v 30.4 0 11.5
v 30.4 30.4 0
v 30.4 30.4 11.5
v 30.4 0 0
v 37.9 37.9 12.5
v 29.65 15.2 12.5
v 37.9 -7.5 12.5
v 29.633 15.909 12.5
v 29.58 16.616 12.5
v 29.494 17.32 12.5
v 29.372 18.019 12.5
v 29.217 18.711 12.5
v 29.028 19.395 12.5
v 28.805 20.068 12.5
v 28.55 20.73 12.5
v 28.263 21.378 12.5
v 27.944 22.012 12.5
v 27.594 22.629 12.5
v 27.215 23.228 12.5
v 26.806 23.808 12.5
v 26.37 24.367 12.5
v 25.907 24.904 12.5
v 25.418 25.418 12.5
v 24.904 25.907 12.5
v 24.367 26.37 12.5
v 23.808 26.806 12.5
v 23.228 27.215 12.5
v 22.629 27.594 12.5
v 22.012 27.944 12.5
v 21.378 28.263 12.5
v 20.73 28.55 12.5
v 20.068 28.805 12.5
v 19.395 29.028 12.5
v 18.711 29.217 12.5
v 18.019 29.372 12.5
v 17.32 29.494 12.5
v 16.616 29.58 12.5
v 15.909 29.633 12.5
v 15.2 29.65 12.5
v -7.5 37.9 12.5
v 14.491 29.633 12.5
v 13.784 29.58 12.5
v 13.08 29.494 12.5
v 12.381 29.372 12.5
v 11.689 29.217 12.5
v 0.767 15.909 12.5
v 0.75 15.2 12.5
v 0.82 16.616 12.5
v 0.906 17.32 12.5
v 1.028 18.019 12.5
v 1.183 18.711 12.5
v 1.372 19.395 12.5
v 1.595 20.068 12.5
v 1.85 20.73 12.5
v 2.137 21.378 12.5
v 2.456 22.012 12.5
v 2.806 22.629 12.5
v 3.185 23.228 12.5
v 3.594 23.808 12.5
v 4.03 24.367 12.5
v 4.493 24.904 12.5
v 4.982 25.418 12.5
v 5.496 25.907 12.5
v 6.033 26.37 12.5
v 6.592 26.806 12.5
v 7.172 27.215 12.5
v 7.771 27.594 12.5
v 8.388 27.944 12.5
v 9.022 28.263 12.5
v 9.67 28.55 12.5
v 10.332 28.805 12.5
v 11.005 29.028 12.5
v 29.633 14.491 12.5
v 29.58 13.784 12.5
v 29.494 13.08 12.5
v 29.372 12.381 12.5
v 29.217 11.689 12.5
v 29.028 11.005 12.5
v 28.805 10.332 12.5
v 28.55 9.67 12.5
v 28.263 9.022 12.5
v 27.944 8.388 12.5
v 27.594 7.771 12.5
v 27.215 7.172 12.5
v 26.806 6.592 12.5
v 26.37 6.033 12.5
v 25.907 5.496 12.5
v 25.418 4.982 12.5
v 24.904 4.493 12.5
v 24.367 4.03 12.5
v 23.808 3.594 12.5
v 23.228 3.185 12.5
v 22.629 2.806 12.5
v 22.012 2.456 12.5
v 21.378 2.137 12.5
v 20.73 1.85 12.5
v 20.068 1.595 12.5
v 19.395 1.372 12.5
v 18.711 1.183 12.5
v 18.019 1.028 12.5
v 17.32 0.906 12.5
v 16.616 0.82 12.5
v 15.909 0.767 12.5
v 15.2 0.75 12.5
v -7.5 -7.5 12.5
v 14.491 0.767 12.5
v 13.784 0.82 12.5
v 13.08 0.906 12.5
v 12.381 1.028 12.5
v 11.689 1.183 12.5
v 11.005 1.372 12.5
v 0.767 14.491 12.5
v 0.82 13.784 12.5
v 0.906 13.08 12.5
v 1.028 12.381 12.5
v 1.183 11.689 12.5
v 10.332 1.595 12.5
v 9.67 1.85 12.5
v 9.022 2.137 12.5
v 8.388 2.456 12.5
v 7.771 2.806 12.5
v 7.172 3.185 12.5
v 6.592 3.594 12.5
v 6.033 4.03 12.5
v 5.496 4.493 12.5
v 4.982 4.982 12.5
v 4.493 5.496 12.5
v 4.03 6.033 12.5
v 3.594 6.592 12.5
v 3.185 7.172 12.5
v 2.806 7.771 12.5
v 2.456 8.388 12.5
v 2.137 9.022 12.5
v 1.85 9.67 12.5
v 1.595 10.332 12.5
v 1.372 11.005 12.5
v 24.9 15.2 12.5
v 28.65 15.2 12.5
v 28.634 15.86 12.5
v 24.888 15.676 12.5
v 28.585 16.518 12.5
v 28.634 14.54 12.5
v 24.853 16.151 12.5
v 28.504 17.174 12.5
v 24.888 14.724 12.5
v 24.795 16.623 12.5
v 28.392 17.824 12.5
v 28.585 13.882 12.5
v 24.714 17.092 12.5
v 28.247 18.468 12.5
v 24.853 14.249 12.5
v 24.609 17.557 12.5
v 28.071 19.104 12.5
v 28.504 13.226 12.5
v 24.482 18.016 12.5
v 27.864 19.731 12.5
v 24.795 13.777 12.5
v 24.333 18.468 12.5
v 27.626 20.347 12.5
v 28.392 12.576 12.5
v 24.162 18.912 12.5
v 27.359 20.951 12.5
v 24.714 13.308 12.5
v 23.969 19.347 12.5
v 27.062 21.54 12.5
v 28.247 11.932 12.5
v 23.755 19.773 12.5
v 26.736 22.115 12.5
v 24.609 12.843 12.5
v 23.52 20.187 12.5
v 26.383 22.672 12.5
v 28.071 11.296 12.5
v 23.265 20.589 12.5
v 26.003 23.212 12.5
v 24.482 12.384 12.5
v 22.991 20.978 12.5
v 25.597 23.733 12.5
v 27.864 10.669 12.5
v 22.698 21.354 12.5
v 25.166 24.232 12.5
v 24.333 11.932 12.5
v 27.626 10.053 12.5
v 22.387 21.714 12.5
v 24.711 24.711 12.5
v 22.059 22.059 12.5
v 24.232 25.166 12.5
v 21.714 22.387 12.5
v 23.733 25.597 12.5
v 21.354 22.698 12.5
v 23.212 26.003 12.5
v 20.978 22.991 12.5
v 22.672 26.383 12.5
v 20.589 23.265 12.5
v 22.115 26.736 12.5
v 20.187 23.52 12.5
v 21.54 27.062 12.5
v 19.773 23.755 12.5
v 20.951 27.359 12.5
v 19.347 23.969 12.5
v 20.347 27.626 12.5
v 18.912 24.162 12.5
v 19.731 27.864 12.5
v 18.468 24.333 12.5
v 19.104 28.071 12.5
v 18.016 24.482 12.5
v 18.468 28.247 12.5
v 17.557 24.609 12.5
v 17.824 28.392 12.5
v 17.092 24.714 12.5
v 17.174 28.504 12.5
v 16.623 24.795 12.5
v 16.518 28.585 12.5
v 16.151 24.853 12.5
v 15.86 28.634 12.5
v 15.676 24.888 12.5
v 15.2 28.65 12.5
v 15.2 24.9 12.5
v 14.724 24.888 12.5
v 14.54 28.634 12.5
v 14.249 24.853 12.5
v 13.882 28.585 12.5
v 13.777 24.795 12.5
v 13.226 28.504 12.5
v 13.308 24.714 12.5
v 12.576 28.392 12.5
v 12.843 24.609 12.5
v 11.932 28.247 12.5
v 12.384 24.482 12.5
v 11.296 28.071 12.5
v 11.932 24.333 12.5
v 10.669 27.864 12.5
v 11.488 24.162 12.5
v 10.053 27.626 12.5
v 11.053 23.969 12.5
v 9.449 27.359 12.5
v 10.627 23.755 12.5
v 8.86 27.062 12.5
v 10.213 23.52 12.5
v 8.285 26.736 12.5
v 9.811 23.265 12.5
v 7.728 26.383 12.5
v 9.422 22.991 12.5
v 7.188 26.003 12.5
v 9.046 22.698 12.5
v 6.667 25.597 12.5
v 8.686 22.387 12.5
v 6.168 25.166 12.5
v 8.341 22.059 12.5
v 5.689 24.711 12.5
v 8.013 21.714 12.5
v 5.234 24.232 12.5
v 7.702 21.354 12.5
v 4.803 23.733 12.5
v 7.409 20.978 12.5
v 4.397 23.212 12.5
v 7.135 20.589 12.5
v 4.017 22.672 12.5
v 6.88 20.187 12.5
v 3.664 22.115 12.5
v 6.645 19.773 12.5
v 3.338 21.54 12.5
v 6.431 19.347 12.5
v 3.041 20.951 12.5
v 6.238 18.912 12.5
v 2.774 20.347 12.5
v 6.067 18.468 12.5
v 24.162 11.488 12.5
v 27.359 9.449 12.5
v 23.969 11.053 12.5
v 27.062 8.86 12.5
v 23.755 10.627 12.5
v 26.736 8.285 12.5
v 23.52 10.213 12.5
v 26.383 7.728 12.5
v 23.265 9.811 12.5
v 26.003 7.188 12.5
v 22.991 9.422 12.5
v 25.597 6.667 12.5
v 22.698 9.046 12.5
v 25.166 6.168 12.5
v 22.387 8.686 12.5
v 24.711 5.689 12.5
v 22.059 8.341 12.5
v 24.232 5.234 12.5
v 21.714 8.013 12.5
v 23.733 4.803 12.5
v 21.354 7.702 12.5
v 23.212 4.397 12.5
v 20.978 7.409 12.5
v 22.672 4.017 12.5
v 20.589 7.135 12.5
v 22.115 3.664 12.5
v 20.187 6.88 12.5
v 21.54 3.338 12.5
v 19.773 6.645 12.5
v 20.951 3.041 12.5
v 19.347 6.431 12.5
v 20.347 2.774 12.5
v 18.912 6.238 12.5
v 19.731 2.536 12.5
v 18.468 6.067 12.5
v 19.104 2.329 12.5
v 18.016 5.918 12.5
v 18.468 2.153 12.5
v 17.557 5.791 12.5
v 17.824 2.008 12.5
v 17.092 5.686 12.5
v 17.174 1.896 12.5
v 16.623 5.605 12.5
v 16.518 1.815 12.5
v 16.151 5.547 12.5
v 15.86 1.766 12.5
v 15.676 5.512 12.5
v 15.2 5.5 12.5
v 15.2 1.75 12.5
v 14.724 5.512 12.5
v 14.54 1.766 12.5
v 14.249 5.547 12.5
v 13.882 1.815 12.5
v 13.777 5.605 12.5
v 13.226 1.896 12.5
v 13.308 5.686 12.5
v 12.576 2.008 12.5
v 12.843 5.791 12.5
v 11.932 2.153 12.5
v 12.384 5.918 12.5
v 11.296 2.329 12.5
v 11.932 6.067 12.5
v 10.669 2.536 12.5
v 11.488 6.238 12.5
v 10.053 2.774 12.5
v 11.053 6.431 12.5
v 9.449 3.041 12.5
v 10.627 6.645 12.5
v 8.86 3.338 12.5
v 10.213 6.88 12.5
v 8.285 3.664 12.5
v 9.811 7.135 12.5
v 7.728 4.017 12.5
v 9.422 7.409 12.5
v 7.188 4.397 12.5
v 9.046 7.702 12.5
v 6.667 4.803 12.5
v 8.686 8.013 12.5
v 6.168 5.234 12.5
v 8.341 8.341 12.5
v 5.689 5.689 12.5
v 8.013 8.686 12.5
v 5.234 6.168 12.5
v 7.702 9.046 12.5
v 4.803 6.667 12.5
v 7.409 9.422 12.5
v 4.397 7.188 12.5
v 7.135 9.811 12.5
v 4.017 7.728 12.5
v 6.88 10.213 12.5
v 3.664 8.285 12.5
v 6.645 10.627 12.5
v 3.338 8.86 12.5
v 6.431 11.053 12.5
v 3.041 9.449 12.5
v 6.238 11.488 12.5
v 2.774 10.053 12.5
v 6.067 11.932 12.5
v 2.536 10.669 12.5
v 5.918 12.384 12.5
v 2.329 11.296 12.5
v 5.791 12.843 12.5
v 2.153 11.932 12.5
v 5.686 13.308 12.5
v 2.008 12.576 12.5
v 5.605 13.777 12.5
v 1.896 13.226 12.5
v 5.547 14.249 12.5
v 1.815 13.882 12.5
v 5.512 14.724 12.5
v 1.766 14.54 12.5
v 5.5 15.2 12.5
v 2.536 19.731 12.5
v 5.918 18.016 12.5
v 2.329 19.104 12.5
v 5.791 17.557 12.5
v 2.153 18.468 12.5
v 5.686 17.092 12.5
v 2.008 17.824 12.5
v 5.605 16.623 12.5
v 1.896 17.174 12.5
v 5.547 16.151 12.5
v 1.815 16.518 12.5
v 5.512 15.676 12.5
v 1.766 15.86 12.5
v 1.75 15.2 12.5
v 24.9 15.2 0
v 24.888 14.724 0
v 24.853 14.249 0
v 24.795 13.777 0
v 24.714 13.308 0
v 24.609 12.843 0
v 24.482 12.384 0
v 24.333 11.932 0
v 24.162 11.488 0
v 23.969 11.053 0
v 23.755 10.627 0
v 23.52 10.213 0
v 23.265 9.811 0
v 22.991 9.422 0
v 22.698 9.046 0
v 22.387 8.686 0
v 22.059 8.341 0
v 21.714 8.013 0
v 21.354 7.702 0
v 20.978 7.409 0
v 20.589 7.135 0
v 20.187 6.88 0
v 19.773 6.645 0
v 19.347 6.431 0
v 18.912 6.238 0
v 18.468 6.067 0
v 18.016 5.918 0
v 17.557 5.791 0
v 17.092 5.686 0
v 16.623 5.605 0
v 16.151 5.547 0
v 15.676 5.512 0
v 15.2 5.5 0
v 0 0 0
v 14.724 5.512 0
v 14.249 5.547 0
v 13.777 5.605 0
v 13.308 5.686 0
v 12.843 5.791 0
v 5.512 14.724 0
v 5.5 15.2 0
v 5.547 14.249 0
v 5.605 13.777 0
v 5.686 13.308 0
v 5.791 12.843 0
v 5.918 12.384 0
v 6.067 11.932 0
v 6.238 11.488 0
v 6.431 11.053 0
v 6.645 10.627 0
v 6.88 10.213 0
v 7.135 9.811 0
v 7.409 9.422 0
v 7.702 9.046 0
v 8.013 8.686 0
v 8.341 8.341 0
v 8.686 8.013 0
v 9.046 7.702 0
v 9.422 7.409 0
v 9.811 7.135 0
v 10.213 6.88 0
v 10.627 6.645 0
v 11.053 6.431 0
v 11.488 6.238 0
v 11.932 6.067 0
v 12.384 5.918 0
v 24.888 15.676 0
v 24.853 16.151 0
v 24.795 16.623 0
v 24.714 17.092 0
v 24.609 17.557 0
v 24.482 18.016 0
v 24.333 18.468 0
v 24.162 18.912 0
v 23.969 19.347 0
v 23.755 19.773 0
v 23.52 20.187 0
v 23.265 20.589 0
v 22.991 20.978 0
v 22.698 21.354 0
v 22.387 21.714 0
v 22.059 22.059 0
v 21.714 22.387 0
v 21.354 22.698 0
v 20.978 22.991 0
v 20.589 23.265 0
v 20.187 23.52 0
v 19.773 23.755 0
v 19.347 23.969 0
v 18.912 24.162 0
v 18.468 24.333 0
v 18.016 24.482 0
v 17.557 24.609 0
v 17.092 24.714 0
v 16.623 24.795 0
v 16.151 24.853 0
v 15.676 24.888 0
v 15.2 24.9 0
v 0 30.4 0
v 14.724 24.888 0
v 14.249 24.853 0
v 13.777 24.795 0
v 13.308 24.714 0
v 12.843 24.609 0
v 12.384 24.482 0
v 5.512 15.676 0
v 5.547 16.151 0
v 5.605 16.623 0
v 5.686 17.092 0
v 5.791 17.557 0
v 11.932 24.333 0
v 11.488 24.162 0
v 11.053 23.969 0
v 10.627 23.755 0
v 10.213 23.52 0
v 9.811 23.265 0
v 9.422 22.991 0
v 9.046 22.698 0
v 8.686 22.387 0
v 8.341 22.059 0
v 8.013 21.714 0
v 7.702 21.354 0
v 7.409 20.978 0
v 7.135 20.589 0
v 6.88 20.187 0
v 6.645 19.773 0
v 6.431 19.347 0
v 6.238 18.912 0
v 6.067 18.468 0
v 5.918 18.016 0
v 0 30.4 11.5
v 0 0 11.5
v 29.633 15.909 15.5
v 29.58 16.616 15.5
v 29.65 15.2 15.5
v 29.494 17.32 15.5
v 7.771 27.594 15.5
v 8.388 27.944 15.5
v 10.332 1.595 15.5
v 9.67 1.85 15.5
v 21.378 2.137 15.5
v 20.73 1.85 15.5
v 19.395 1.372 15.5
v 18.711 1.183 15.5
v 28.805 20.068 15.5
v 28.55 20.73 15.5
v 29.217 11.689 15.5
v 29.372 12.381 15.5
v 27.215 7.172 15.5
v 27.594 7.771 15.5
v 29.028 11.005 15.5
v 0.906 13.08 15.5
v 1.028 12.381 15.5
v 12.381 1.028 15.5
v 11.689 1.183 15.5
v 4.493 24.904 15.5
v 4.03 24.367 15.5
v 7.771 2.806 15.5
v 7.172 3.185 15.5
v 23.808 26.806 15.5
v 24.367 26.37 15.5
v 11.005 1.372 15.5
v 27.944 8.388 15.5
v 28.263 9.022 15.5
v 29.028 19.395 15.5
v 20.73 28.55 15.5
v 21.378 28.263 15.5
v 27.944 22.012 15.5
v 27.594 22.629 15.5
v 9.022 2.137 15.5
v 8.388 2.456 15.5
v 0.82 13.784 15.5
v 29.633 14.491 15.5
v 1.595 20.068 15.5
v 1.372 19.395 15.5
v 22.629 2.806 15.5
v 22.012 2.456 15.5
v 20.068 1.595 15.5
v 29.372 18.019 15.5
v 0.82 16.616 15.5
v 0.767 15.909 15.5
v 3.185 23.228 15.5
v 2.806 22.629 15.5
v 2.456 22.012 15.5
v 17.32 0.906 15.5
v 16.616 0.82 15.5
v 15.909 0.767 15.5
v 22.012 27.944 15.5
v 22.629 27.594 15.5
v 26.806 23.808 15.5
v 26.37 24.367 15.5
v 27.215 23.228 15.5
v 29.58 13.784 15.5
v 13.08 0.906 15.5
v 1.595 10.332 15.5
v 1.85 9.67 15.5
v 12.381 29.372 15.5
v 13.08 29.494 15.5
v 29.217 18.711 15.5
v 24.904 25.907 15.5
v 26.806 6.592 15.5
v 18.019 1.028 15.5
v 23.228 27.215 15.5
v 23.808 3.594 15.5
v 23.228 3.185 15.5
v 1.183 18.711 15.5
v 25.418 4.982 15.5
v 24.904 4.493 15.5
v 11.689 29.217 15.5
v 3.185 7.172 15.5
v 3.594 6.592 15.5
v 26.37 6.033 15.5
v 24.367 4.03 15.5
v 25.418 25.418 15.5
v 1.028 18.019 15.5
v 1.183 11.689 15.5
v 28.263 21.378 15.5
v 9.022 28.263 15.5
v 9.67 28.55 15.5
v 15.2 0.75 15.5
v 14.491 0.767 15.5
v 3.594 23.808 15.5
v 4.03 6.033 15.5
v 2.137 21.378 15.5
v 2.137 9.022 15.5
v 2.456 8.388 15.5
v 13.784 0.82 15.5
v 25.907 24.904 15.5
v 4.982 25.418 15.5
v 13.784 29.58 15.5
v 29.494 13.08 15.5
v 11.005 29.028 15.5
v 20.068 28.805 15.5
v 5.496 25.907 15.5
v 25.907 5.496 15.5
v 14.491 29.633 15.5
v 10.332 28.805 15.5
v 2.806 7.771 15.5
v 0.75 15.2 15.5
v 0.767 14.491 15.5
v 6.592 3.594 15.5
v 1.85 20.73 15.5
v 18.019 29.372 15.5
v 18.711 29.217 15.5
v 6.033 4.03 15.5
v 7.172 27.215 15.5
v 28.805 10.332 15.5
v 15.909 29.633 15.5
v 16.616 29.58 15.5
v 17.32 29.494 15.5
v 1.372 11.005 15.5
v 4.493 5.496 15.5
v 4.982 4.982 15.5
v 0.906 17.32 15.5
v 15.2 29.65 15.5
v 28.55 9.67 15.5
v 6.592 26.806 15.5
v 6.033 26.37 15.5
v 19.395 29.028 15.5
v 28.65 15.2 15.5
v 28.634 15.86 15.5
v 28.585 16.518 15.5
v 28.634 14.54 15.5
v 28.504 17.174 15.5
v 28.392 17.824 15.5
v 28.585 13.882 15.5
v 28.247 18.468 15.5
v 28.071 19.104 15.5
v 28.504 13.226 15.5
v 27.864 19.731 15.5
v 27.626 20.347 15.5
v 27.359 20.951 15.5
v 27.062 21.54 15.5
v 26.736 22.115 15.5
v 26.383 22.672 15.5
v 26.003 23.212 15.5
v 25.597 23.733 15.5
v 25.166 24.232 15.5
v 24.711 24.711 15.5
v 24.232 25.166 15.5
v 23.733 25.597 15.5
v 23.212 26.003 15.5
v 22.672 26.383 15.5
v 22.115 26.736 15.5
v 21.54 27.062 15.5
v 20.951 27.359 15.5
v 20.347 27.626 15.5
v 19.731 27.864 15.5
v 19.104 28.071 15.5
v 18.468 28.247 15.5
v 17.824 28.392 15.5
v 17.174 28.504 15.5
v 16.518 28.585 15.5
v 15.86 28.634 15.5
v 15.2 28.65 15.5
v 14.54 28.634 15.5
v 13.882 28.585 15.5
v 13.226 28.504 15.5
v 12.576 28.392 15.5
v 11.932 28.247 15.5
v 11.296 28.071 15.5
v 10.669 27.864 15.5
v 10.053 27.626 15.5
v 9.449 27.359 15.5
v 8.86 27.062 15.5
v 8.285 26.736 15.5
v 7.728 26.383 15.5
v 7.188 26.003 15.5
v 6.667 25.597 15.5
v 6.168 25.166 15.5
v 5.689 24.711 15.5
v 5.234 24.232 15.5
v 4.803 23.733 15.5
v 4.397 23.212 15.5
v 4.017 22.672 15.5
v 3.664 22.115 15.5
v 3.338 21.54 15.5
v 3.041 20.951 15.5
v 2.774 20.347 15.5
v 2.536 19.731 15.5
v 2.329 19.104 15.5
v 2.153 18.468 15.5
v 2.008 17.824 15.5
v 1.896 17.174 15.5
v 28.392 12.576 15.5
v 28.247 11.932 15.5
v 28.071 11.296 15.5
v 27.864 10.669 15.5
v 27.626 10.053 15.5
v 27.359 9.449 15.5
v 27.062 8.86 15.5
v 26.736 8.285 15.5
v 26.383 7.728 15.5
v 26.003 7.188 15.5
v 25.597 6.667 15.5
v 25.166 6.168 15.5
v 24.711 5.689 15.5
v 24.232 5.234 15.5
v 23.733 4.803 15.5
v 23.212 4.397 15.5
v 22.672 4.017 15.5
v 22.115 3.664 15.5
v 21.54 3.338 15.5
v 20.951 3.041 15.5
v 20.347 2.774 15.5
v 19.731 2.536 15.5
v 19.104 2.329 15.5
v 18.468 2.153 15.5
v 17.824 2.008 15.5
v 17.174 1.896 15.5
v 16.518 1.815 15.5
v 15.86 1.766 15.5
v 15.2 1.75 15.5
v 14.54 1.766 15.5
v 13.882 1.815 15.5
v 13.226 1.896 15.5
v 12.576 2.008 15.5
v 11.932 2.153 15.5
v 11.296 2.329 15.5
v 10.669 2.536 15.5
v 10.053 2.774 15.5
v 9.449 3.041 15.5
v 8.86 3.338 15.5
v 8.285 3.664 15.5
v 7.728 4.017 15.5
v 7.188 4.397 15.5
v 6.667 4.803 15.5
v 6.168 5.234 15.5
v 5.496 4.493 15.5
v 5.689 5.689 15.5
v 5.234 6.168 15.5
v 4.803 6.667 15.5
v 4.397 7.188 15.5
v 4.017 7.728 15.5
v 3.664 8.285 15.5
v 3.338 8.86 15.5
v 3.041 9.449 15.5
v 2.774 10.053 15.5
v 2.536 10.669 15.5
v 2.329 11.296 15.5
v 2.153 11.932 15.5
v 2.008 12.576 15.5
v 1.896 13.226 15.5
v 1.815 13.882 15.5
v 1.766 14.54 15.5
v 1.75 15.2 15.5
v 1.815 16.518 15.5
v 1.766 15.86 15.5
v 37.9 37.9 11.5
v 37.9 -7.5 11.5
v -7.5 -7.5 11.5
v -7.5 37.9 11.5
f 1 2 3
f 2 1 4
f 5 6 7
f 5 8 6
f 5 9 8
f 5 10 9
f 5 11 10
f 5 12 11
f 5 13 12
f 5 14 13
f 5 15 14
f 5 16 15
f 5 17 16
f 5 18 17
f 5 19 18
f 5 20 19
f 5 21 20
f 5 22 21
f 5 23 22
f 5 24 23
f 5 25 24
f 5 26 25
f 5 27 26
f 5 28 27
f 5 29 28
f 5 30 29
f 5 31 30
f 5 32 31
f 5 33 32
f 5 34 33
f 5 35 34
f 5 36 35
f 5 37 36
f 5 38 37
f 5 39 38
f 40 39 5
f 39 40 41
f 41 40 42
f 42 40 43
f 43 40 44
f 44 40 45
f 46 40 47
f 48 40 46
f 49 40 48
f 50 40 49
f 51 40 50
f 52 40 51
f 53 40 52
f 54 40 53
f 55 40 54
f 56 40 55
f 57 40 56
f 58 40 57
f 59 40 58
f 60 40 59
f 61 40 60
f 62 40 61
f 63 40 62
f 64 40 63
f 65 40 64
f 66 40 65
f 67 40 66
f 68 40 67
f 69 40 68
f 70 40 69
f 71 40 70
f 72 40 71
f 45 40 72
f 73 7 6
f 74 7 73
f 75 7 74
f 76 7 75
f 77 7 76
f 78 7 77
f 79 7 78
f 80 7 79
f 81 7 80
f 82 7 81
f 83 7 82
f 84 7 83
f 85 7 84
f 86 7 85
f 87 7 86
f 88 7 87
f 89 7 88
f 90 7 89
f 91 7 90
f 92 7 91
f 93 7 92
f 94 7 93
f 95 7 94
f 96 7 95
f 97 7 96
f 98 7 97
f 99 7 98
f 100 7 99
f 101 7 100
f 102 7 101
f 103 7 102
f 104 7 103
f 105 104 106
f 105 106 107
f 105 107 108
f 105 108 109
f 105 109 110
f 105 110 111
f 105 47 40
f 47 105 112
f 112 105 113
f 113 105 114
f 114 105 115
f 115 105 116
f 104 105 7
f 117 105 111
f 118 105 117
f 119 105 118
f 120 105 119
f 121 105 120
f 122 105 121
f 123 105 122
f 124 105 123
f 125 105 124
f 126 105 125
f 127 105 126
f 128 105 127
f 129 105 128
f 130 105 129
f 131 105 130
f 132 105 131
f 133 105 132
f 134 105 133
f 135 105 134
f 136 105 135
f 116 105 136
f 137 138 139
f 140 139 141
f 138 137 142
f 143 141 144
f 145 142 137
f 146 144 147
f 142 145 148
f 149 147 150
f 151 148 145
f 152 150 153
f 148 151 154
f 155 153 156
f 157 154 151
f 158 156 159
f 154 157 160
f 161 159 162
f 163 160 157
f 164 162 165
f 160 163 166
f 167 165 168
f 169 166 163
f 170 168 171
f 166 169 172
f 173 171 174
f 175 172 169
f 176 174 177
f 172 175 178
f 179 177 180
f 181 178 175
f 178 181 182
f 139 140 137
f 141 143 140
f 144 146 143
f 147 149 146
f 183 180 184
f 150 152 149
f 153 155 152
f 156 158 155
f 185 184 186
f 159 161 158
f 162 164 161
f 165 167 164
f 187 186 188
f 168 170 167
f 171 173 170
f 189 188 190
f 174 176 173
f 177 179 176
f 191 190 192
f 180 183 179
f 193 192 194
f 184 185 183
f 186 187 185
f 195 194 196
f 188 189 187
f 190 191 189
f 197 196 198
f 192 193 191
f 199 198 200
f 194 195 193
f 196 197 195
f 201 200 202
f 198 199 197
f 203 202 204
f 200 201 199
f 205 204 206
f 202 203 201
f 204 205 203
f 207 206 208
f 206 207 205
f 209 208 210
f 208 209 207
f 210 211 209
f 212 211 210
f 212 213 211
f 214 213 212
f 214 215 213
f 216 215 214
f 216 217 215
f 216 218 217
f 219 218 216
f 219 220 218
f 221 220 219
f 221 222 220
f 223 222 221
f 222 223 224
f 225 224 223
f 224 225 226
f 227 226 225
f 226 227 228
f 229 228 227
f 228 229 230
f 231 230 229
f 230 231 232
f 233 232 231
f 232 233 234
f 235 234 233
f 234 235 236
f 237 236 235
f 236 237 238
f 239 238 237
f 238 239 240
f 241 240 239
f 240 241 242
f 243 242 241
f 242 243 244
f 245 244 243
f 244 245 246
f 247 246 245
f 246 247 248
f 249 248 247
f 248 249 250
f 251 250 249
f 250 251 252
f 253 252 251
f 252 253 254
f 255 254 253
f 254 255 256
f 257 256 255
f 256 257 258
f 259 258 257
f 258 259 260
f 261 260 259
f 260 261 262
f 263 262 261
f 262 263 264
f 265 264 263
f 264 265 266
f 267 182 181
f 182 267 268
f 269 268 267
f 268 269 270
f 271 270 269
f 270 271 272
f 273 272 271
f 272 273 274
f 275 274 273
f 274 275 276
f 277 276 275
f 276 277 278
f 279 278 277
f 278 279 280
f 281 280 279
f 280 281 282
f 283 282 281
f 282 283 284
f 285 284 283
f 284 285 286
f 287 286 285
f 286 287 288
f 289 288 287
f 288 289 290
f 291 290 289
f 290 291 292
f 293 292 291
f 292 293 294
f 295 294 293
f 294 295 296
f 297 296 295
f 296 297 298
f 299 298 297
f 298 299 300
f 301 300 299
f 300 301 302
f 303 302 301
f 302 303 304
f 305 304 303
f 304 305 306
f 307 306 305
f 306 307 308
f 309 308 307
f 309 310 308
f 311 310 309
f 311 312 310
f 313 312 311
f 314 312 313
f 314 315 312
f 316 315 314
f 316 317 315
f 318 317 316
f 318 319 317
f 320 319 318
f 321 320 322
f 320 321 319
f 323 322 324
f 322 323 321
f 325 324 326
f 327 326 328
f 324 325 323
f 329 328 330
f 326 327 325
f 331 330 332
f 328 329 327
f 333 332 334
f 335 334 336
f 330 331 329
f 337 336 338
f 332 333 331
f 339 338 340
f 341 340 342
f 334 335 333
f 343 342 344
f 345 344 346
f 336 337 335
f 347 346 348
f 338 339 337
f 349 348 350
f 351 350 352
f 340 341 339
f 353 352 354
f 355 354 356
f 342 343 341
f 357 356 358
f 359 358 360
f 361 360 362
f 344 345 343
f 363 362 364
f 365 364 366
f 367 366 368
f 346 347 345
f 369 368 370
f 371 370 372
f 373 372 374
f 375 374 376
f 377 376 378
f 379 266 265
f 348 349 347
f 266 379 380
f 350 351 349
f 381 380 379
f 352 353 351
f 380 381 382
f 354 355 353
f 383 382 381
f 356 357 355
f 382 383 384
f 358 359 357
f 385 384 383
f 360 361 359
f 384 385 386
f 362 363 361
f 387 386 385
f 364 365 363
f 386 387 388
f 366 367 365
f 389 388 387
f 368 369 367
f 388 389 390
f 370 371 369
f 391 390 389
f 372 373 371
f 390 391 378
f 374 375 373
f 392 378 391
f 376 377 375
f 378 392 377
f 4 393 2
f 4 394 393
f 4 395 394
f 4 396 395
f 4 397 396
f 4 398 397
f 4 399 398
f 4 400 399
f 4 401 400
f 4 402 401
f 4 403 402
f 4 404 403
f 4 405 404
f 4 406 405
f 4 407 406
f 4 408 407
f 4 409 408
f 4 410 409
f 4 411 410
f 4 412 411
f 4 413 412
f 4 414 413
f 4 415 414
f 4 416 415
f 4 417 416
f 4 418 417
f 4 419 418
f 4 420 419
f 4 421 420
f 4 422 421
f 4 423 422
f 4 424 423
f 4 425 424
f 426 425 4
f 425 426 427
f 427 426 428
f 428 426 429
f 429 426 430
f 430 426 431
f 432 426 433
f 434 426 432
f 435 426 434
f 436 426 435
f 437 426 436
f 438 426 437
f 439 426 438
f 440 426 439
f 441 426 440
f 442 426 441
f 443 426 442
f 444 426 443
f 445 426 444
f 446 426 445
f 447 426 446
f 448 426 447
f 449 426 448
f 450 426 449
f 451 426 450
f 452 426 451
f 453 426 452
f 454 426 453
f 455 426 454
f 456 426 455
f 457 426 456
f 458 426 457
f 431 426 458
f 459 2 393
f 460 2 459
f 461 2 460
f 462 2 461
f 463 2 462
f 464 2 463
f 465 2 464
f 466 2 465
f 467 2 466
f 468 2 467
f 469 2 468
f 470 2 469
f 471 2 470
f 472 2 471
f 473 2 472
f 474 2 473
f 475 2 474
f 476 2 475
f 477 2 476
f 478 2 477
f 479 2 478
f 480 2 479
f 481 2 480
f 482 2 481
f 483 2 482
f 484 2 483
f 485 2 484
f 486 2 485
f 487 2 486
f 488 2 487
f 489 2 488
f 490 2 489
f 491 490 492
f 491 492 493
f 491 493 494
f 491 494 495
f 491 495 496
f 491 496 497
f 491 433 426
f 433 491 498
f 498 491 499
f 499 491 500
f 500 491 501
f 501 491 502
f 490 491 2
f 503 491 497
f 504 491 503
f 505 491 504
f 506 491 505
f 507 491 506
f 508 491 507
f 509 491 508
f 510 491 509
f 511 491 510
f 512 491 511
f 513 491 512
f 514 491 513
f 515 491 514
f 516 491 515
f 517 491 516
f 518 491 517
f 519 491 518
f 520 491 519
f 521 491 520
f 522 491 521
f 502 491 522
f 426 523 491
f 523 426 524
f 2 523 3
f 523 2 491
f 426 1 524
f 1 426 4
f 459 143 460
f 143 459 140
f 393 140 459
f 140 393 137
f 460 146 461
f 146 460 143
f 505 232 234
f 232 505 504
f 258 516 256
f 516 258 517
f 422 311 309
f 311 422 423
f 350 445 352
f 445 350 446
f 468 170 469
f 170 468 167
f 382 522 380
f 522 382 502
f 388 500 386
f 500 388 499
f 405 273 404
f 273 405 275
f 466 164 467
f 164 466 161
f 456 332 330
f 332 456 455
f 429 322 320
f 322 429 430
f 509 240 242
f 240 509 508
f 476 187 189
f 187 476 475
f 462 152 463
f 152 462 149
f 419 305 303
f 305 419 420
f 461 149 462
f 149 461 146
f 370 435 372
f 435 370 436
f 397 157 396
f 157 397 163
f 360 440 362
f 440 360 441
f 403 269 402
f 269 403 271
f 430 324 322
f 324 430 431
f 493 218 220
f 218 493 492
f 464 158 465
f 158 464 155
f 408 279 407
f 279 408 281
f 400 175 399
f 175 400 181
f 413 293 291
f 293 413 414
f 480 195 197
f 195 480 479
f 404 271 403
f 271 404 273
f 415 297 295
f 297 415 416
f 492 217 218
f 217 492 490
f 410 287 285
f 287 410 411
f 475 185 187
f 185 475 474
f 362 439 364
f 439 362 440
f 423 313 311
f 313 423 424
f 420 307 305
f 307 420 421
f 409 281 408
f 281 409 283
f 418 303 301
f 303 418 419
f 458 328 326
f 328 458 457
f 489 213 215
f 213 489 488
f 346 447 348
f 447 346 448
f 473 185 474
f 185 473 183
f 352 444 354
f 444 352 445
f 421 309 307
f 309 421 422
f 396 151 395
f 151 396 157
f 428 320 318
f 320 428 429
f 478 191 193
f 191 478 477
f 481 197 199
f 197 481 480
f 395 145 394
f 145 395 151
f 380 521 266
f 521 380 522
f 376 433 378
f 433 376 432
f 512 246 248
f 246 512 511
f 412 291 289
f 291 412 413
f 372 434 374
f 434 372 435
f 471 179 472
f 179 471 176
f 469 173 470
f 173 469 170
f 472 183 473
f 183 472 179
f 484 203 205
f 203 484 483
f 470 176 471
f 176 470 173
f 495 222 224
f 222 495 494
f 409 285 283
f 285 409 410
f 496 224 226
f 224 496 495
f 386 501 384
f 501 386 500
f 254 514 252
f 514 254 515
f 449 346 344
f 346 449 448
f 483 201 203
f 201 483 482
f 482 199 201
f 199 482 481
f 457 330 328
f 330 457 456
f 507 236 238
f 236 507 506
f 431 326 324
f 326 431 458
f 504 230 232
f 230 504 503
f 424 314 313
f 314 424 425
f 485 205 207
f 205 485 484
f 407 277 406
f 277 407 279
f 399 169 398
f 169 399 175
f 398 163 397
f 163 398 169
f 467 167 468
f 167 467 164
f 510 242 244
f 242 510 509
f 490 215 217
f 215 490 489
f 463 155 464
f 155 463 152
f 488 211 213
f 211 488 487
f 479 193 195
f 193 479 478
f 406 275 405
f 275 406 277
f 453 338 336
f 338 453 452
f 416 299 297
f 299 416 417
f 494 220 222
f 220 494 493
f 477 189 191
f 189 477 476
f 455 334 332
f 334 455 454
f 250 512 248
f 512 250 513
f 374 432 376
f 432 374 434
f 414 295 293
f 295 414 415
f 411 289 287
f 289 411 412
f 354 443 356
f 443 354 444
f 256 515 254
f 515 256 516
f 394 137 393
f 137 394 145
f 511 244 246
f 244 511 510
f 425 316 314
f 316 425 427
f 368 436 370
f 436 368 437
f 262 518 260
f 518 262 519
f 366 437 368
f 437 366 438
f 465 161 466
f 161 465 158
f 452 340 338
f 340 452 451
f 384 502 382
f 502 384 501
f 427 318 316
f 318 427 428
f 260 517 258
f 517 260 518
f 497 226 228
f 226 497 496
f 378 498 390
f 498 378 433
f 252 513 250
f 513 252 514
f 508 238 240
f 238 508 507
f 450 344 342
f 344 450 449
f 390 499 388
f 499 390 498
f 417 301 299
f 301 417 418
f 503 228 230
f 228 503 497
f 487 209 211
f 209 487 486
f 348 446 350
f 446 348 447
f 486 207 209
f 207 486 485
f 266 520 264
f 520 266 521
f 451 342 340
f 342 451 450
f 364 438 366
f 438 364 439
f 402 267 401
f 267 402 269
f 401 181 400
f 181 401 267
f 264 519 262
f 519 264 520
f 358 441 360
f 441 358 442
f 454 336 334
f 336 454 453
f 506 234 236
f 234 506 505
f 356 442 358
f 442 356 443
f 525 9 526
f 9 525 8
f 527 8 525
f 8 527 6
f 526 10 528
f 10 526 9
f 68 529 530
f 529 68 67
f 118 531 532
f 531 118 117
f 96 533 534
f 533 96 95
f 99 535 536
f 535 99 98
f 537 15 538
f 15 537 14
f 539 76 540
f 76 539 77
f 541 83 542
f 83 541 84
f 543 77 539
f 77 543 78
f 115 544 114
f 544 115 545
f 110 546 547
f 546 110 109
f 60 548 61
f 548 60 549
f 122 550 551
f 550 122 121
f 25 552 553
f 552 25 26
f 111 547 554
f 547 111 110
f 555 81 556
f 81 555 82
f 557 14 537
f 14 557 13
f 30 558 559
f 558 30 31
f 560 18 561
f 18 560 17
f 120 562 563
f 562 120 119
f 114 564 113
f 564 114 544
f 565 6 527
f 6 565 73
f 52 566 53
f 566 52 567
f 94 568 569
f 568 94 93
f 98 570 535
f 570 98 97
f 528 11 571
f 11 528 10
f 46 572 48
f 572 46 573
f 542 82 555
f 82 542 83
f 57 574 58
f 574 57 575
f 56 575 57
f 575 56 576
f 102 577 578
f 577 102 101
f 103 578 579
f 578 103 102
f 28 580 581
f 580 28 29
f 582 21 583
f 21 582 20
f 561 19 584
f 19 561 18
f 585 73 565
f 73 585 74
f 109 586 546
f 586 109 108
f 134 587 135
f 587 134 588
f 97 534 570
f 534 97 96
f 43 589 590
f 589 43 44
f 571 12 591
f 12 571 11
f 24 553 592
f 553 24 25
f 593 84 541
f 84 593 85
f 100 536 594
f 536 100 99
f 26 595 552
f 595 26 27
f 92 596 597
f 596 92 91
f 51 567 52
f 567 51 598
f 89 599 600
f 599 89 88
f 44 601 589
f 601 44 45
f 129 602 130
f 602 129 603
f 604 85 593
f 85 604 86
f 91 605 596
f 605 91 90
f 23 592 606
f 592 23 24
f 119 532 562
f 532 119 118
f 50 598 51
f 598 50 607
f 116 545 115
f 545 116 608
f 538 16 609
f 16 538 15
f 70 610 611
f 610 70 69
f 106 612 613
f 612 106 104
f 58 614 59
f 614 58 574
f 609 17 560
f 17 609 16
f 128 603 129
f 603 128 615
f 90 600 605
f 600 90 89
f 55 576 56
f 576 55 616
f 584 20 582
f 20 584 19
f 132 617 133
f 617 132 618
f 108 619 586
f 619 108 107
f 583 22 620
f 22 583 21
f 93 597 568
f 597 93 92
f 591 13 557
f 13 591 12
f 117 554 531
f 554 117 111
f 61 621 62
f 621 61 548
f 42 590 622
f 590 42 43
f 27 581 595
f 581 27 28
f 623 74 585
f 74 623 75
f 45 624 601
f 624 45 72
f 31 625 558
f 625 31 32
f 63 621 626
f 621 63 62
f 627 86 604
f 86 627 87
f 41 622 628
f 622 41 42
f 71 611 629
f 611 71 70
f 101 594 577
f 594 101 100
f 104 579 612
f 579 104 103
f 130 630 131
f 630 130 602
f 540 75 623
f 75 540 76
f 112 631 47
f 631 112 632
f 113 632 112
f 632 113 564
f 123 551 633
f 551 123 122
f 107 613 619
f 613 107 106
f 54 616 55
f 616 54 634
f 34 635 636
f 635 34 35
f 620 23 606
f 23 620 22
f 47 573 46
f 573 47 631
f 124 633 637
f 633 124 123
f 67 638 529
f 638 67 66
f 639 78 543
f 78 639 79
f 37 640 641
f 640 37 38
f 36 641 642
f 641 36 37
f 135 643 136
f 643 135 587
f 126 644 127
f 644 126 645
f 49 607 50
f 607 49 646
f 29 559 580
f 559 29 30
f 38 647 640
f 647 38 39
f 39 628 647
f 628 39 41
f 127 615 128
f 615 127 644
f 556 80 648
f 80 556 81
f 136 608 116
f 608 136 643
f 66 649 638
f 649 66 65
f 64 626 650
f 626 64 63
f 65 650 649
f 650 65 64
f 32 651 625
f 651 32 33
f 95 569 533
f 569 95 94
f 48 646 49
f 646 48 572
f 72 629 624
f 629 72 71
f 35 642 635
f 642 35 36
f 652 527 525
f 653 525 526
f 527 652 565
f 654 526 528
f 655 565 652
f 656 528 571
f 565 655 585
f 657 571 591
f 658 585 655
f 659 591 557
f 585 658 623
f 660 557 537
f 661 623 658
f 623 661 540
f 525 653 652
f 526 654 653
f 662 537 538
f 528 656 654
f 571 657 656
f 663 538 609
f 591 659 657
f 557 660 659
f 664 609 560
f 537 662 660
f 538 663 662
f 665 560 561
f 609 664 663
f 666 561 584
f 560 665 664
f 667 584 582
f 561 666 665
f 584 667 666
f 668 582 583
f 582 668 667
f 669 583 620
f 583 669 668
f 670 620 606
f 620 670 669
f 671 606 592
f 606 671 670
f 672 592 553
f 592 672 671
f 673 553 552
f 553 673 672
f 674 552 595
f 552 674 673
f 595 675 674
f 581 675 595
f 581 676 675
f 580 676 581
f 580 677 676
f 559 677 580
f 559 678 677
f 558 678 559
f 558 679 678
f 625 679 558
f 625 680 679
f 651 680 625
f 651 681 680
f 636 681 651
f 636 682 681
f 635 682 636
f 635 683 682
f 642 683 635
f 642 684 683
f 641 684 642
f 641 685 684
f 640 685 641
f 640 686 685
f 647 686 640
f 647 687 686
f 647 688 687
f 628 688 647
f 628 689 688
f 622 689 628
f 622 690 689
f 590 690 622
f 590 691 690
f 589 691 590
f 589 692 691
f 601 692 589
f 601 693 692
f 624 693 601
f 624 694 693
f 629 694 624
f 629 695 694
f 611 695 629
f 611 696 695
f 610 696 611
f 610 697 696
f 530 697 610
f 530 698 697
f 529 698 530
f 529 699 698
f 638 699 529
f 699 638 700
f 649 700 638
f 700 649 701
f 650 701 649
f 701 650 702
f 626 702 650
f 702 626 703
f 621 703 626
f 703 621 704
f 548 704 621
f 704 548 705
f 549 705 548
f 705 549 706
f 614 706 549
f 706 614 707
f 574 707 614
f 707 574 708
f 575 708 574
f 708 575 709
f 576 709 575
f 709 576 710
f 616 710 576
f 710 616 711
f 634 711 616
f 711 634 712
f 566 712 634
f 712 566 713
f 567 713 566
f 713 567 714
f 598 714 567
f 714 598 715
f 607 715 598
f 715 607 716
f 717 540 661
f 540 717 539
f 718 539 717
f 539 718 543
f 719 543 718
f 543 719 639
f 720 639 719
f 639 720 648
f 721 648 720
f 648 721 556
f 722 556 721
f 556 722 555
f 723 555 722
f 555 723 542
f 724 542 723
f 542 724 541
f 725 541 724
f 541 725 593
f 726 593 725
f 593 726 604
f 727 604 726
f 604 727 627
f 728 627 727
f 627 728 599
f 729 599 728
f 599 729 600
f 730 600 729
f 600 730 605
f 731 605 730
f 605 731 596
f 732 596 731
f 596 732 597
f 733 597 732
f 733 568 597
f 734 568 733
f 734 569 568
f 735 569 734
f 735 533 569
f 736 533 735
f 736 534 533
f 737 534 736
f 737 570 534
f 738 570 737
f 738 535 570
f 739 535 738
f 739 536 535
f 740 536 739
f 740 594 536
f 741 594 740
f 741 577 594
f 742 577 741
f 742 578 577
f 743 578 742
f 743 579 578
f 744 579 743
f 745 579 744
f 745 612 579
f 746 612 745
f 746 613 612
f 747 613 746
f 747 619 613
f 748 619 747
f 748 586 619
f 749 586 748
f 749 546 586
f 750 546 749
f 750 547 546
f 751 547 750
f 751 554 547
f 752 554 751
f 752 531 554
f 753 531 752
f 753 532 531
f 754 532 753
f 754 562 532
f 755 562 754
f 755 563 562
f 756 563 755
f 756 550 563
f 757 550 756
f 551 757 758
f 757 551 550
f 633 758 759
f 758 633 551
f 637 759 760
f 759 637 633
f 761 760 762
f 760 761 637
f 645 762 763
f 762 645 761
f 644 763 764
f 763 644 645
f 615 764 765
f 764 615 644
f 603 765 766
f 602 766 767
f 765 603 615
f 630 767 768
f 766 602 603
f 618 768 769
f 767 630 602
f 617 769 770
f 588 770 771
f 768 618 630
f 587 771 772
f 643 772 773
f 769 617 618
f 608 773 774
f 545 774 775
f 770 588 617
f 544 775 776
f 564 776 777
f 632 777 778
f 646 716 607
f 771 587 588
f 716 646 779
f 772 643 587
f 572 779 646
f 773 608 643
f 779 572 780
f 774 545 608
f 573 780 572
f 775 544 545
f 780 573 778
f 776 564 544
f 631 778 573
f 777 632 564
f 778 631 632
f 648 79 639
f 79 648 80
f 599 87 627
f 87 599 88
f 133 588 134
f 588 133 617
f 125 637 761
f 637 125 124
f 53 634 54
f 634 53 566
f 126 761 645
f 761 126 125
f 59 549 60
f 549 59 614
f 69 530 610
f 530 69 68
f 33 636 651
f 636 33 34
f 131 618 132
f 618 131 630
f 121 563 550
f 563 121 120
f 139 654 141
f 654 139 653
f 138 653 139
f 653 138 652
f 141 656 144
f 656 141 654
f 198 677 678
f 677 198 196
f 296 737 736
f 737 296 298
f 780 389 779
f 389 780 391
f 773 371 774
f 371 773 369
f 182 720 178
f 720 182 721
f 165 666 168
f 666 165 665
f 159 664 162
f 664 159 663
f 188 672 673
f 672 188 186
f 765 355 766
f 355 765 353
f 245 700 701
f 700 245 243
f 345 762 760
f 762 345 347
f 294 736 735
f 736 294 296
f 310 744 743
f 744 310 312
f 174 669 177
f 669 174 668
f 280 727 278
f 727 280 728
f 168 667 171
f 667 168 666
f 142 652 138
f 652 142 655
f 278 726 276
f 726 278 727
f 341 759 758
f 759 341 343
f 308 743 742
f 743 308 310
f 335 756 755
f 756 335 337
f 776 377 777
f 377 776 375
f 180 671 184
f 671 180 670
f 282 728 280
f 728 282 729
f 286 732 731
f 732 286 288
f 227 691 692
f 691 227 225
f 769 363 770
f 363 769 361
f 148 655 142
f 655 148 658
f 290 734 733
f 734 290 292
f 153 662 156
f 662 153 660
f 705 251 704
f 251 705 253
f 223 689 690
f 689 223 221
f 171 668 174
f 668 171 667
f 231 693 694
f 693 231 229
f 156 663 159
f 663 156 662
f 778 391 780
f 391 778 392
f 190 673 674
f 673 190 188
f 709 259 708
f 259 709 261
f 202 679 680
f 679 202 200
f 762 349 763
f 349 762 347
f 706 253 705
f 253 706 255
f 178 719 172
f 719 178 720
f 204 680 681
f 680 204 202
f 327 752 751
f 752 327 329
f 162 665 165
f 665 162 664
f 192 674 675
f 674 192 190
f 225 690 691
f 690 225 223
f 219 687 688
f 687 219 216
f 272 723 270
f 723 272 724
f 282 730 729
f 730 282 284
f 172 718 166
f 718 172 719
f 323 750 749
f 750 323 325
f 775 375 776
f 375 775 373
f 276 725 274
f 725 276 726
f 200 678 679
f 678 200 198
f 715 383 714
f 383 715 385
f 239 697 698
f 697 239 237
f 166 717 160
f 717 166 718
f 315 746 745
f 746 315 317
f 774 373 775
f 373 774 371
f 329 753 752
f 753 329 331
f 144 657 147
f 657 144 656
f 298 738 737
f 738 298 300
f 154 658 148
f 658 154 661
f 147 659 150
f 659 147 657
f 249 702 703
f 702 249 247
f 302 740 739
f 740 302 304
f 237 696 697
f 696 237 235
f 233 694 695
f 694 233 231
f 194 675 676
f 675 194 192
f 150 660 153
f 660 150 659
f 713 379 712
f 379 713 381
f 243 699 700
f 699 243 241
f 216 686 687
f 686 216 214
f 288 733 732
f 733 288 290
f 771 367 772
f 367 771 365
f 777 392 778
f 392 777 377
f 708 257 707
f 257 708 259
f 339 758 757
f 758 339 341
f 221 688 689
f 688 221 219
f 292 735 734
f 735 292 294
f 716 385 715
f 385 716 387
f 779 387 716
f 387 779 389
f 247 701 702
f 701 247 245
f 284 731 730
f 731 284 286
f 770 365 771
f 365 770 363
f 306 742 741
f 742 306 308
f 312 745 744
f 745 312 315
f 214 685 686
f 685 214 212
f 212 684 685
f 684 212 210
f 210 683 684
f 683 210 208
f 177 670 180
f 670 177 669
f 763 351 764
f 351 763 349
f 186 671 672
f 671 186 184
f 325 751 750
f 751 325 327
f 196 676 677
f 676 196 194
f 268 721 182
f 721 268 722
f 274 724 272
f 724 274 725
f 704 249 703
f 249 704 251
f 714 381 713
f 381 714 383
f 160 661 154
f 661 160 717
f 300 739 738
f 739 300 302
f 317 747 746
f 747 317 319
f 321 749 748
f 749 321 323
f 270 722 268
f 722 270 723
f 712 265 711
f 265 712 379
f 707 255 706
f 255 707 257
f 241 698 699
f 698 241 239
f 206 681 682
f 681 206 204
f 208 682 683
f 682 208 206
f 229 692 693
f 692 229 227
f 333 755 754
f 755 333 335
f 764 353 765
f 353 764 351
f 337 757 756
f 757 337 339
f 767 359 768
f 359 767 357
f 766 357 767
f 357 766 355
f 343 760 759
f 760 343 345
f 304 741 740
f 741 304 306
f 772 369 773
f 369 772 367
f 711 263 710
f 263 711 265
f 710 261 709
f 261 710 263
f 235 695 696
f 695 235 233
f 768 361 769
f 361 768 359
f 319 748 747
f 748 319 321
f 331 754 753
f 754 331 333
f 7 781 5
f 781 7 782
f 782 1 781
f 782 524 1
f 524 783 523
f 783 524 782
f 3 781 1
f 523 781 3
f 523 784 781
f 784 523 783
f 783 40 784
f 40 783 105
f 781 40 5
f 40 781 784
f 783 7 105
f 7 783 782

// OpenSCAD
fn = 128;
epoxy_width = 0.75;
lens_diameter = 25.4;
lens_radius = lens_diameter / 2.0;
lens_flange = 3.0;
optical_channel_radius = lens_radius - lens_flange;
housing_radius = lens_radius + epoxy_width;
housing_side_dim = lens_diameter + 5;
housing_height = 12.5;
lens_fitting_rim = 3;
flange_dim = 15;
thickness = 1;

module housing_body() {
  difference() {
    cube(size = [housing_side_dim, housing_side_dim, housing_height]);
    translate([housing_side_dim/2, housing_side_dim/2, 0])
    cylinder(h = housing_height,
             r1 = optical_channel_radius,
             r2 = optical_channel_radius, $fn=fn);
  }
}

module lens_rim() {
  translate([housing_side_dim/2, housing_side_dim/2, housing_height]) {
    difference() {
      cylinder(h = lens_fitting_rim,
               r1 = housing_radius+thickness,
               r2 = housing_radius+thickness, $fn=fn);
      cylinder(h = lens_fitting_rim,
               r1 = housing_radius,
               r2 = housing_radius, $fn=fn);
    }
  }
}

module housing_flange() {
  translate([-flange_dim/2, -flange_dim/2,
             housing_height-thickness]) {
    difference() {
      cube(size = [housing_side_dim+flange_dim,
                   housing_side_dim+flange_dim, thickness]);
      translate([flange_dim/2, flange_dim/2, 0])
      cube(size = [housing_side_dim, housing_side_dim, thickness]);
    }
  }
}

module render() {
  union() {
    housing_body();
    lens_rim();
    housing_flange();
  }
}


echo(version=version());

render();
